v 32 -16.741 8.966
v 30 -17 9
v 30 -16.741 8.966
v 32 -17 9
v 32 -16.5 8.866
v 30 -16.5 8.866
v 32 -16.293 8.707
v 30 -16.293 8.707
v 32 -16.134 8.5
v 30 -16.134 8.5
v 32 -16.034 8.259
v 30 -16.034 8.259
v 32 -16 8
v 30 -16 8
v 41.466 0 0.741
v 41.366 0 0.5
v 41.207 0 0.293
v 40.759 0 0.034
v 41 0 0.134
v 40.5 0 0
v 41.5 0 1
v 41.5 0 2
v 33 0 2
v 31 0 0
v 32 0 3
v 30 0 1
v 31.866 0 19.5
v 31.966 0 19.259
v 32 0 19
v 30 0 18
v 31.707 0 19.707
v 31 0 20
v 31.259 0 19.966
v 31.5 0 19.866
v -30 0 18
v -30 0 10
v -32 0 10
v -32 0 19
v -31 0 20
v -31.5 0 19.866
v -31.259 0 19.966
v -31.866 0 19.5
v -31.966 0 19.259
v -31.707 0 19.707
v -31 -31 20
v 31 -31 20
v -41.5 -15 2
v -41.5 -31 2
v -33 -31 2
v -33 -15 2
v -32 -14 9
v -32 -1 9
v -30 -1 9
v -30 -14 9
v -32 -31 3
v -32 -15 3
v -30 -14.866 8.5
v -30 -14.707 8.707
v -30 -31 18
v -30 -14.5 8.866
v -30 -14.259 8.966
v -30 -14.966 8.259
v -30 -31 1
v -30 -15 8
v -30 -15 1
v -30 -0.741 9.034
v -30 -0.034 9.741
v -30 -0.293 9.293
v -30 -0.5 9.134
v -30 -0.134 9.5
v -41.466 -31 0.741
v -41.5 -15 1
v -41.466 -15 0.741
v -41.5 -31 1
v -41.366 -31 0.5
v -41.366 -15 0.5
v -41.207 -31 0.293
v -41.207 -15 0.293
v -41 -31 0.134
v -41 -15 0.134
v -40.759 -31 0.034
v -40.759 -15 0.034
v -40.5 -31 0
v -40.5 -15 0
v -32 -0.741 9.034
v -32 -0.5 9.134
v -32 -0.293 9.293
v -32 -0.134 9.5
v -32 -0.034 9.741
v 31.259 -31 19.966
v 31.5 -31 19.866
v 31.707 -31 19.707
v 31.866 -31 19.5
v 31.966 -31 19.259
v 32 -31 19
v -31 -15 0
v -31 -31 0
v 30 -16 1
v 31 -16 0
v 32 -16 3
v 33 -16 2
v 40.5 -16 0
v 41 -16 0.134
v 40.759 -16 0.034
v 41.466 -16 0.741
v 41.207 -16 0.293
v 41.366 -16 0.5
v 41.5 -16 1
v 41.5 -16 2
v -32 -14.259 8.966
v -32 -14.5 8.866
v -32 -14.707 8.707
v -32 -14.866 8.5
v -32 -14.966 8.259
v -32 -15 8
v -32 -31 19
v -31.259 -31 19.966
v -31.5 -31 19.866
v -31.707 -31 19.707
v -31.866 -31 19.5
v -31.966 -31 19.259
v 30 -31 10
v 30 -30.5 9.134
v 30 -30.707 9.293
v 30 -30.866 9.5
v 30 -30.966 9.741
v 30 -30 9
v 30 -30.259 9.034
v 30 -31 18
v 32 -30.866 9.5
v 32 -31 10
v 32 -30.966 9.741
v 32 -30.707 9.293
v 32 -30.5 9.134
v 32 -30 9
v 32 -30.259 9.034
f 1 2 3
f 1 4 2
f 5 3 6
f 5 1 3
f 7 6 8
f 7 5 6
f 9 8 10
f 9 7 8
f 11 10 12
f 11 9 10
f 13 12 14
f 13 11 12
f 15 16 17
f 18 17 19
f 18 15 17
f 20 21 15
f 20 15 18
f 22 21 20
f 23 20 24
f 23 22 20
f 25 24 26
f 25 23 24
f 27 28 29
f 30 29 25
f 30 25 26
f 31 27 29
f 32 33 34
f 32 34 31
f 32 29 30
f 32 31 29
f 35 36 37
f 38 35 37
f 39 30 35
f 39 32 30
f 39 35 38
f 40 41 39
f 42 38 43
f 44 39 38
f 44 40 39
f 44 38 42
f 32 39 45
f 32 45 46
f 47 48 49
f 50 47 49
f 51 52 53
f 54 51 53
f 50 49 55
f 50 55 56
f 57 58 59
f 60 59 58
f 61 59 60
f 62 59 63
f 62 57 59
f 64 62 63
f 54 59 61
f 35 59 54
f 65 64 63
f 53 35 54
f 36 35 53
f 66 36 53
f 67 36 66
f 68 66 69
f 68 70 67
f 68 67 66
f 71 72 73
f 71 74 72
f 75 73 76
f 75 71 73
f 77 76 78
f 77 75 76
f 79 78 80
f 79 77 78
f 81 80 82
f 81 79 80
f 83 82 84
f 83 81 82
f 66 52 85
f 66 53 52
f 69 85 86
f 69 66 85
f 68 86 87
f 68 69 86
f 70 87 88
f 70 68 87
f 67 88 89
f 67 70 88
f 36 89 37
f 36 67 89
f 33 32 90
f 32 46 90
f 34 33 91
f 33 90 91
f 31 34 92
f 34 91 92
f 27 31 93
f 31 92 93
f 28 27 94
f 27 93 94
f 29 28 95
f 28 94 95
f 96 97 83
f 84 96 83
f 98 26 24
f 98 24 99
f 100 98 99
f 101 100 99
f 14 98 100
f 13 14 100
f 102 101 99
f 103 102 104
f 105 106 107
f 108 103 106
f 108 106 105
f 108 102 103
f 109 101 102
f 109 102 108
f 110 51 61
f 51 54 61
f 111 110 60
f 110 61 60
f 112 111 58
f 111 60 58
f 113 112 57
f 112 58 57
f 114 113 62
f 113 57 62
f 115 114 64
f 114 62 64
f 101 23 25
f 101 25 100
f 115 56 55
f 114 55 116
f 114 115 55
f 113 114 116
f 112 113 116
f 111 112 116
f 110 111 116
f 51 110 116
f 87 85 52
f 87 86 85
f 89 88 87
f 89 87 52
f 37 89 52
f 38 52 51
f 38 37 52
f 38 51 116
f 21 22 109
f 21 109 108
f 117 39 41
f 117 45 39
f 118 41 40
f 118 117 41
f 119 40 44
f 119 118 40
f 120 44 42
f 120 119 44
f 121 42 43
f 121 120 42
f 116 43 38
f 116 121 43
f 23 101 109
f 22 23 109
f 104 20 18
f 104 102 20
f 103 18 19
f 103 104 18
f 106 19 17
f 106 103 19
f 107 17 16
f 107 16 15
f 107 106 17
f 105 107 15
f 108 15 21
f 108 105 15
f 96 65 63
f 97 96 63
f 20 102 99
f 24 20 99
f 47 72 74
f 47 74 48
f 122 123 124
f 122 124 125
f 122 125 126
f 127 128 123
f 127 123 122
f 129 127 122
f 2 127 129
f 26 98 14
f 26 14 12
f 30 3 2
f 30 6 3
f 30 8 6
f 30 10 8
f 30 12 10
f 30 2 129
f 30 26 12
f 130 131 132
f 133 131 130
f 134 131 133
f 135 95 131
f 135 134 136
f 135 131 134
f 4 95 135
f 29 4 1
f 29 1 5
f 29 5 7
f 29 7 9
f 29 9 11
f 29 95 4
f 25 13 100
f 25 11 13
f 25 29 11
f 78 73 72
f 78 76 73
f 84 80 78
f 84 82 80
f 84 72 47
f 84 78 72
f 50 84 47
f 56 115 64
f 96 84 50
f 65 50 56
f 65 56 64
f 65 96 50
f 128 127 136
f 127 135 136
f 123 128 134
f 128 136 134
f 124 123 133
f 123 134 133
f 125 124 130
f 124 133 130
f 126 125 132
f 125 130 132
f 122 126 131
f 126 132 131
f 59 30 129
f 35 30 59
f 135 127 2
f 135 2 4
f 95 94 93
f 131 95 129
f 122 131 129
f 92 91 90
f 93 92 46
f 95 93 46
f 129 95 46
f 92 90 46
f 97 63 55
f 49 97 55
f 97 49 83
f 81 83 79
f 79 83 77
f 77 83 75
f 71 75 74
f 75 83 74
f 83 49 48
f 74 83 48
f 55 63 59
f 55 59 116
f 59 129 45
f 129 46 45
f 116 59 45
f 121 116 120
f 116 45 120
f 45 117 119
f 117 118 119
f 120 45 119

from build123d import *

# Parameters (mm, degrees)
PAD_DEPTH       = 31
SKETCH001_W     = 13.134895
SKETCH001_H     = 10.824528
POCKET_DEPTH    = 15
SKETCH002_W     = 13.312798
SKETCH002_H     = 10.464958
POCKET001_DEPTH = 15
FILLET_R        = 1
FILLET001_R     = 1
FILLET002_R     = 1
FILLET003_R     = 1
FILLET004_R     = 1
FILLET005_R     = 1
FILLET006_R     = 1
CHAMFER_SIZE    = 1
FILLET007_R     = 1
FILLET008_R     = 1
FILLET009_R     = 1
CHAMFER001_SIZE = 1
SKETCH003_W     = 10.93087
SKETCH003_H     = 6.35841
POCKET002_DEPTH = 16
SKETCH004_W     = 11.221859
SKETCH004_H     = 6.266699
POCKET003_DEPTH = 17
CHAMFER002_SIZE = 1
CHAMFER003_SIZE = 1


with BuildPart() as part:
    # Sketch → Pad (new body)
    with BuildSketch(Plane.XZ):
        Polygon((-32, 20), (32, 20), (32, 7), (41.5, 7), (41.5, 0), (30, 0), (30, 18), (-30, 18), (-30, 0), (-41.5, 0), (-41.5, 7), (-32, 7), align=None)
    extrude(amount=PAD_DEPTH)

    # Sketch001 (on Face13 of Pad) → Pocket (cut)
    with BuildSketch(Plane(origin=(0, 0, 0), x_dir=(1, 0, 0), z_dir=(0, 1, 0))):
        with Locations((-36.5674475, -3.587736)):
            Rectangle(SKETCH001_W, SKETCH001_H)
    extrude(amount=-POCKET_DEPTH, mode=Mode.SUBTRACT)

    # Sketch002 (on Face5 of Pocket) → Pocket001 (cut)
    with BuildSketch(Plane.XZ.offset(31)):
        with Locations((36.656399, 3.767521)):
            Rectangle(SKETCH002_W, SKETCH002_H)
    extrude(amount=-POCKET001_DEPTH, mode=Mode.SUBTRACT)

    # Fillet
    fillet_edges = [part.edges().sort_by_distance(p)[0] for p in [
        (32, -15.5, 20),
    ]]
    fillet(fillet_edges, radius=FILLET_R)

    # Fillet001
    fillet001_edges = [part.edges().sort_by_distance(p)[0] for p in [
        (-32, -15.5, 20),
    ]]
    fillet(fillet001_edges, radius=FILLET001_R)

    # Fillet002
    fillet002_edges = [part.edges().sort_by_distance(p)[0] for p in [
        (-31, -15, 9),
    ]]
    fillet(fillet002_edges, radius=FILLET002_R)

    # Fillet003
    fillet003_edges = [part.edges().sort_by_distance(p)[0] for p in [
        (-31, 0, 9),
    ]]
    fillet(fillet003_edges, radius=FILLET003_R)

    # Fillet004
    fillet004_edges = [part.edges().sort_by_distance(p)[0] for p in [
        (31, -16, 9),
    ]]
    fillet(fillet004_edges, radius=FILLET004_R)

    # Fillet005
    fillet005_edges = [part.edges().sort_by_distance(p)[0] for p in [
        (31, -31, 9),
    ]]
    fillet(fillet005_edges, radius=FILLET005_R)

    # Fillet006
    fillet006_edges = [part.edges().sort_by_distance(p)[0] for p in [
        (41.5, -8, 7),
    ]]
    fillet(fillet006_edges, radius=FILLET006_R)

    # Chamfer
    chamfer_edges = [part.edges().sort_by_distance(p)[0] for p in [
        (30, -8, 0),
    ]]
    chamfer(chamfer_edges, length=CHAMFER_SIZE)

    # Fillet007
    fillet007_edges = [part.edges().sort_by_distance(p)[0] for p in [
        (41.5, -8, 0),
    ]]
    fillet(fillet007_edges, radius=FILLET007_R)

    # Fillet008
    fillet008_edges = [part.edges().sort_by_distance(p)[0] for p in [
        (-41.5, -23, 7),
    ]]
    fillet(fillet008_edges, radius=FILLET008_R)

    # Fillet009
    fillet009_edges = [part.edges().sort_by_distance(p)[0] for p in [
        (-41.5, -23, 0),
    ]]
    fillet(fillet009_edges, radius=FILLET009_R)

    # Chamfer001
    chamfer001_edges = [part.edges().sort_by_distance(p)[0] for p in [
        (-30, -23, 0),
    ]]
    chamfer(chamfer001_edges, length=CHAMFER001_SIZE)

    # Sketch003 (on Face21 of Chamfer001) → Pocket002 (cut)
    with BuildSketch(Plane(origin=(0, 0, 0), x_dir=(1, 0, 0), z_dir=(0, 1, 0))):
        with Locations((37.465435, -5.179205)):
            Rectangle(SKETCH003_W, SKETCH003_H)
    extrude(amount=-POCKET002_DEPTH, mode=Mode.SUBTRACT)

    # Sketch004 (on Face1 of Pocket002) → Pocket003 (cut)
    with BuildSketch(Plane.XZ.offset(31)):
        with Locations((-37.6109295, 5.1333495)):
            Rectangle(SKETCH004_W, SKETCH004_H)
    extrude(amount=-POCKET003_DEPTH, mode=Mode.SUBTRACT)

    # Chamfer002
    chamfer002_edges = [part.edges().sort_by_distance(p)[0] for p in [
        (-32, -23, 2),
    ]]
    chamfer(chamfer002_edges, length=CHAMFER002_SIZE)

    # Chamfer003
    chamfer003_edges = [part.edges().sort_by_distance(p)[0] for p in [
        (32, -8, 2),
    ]]
    chamfer(chamfer003_edges, length=CHAMFER003_SIZE)


solid = part.part
